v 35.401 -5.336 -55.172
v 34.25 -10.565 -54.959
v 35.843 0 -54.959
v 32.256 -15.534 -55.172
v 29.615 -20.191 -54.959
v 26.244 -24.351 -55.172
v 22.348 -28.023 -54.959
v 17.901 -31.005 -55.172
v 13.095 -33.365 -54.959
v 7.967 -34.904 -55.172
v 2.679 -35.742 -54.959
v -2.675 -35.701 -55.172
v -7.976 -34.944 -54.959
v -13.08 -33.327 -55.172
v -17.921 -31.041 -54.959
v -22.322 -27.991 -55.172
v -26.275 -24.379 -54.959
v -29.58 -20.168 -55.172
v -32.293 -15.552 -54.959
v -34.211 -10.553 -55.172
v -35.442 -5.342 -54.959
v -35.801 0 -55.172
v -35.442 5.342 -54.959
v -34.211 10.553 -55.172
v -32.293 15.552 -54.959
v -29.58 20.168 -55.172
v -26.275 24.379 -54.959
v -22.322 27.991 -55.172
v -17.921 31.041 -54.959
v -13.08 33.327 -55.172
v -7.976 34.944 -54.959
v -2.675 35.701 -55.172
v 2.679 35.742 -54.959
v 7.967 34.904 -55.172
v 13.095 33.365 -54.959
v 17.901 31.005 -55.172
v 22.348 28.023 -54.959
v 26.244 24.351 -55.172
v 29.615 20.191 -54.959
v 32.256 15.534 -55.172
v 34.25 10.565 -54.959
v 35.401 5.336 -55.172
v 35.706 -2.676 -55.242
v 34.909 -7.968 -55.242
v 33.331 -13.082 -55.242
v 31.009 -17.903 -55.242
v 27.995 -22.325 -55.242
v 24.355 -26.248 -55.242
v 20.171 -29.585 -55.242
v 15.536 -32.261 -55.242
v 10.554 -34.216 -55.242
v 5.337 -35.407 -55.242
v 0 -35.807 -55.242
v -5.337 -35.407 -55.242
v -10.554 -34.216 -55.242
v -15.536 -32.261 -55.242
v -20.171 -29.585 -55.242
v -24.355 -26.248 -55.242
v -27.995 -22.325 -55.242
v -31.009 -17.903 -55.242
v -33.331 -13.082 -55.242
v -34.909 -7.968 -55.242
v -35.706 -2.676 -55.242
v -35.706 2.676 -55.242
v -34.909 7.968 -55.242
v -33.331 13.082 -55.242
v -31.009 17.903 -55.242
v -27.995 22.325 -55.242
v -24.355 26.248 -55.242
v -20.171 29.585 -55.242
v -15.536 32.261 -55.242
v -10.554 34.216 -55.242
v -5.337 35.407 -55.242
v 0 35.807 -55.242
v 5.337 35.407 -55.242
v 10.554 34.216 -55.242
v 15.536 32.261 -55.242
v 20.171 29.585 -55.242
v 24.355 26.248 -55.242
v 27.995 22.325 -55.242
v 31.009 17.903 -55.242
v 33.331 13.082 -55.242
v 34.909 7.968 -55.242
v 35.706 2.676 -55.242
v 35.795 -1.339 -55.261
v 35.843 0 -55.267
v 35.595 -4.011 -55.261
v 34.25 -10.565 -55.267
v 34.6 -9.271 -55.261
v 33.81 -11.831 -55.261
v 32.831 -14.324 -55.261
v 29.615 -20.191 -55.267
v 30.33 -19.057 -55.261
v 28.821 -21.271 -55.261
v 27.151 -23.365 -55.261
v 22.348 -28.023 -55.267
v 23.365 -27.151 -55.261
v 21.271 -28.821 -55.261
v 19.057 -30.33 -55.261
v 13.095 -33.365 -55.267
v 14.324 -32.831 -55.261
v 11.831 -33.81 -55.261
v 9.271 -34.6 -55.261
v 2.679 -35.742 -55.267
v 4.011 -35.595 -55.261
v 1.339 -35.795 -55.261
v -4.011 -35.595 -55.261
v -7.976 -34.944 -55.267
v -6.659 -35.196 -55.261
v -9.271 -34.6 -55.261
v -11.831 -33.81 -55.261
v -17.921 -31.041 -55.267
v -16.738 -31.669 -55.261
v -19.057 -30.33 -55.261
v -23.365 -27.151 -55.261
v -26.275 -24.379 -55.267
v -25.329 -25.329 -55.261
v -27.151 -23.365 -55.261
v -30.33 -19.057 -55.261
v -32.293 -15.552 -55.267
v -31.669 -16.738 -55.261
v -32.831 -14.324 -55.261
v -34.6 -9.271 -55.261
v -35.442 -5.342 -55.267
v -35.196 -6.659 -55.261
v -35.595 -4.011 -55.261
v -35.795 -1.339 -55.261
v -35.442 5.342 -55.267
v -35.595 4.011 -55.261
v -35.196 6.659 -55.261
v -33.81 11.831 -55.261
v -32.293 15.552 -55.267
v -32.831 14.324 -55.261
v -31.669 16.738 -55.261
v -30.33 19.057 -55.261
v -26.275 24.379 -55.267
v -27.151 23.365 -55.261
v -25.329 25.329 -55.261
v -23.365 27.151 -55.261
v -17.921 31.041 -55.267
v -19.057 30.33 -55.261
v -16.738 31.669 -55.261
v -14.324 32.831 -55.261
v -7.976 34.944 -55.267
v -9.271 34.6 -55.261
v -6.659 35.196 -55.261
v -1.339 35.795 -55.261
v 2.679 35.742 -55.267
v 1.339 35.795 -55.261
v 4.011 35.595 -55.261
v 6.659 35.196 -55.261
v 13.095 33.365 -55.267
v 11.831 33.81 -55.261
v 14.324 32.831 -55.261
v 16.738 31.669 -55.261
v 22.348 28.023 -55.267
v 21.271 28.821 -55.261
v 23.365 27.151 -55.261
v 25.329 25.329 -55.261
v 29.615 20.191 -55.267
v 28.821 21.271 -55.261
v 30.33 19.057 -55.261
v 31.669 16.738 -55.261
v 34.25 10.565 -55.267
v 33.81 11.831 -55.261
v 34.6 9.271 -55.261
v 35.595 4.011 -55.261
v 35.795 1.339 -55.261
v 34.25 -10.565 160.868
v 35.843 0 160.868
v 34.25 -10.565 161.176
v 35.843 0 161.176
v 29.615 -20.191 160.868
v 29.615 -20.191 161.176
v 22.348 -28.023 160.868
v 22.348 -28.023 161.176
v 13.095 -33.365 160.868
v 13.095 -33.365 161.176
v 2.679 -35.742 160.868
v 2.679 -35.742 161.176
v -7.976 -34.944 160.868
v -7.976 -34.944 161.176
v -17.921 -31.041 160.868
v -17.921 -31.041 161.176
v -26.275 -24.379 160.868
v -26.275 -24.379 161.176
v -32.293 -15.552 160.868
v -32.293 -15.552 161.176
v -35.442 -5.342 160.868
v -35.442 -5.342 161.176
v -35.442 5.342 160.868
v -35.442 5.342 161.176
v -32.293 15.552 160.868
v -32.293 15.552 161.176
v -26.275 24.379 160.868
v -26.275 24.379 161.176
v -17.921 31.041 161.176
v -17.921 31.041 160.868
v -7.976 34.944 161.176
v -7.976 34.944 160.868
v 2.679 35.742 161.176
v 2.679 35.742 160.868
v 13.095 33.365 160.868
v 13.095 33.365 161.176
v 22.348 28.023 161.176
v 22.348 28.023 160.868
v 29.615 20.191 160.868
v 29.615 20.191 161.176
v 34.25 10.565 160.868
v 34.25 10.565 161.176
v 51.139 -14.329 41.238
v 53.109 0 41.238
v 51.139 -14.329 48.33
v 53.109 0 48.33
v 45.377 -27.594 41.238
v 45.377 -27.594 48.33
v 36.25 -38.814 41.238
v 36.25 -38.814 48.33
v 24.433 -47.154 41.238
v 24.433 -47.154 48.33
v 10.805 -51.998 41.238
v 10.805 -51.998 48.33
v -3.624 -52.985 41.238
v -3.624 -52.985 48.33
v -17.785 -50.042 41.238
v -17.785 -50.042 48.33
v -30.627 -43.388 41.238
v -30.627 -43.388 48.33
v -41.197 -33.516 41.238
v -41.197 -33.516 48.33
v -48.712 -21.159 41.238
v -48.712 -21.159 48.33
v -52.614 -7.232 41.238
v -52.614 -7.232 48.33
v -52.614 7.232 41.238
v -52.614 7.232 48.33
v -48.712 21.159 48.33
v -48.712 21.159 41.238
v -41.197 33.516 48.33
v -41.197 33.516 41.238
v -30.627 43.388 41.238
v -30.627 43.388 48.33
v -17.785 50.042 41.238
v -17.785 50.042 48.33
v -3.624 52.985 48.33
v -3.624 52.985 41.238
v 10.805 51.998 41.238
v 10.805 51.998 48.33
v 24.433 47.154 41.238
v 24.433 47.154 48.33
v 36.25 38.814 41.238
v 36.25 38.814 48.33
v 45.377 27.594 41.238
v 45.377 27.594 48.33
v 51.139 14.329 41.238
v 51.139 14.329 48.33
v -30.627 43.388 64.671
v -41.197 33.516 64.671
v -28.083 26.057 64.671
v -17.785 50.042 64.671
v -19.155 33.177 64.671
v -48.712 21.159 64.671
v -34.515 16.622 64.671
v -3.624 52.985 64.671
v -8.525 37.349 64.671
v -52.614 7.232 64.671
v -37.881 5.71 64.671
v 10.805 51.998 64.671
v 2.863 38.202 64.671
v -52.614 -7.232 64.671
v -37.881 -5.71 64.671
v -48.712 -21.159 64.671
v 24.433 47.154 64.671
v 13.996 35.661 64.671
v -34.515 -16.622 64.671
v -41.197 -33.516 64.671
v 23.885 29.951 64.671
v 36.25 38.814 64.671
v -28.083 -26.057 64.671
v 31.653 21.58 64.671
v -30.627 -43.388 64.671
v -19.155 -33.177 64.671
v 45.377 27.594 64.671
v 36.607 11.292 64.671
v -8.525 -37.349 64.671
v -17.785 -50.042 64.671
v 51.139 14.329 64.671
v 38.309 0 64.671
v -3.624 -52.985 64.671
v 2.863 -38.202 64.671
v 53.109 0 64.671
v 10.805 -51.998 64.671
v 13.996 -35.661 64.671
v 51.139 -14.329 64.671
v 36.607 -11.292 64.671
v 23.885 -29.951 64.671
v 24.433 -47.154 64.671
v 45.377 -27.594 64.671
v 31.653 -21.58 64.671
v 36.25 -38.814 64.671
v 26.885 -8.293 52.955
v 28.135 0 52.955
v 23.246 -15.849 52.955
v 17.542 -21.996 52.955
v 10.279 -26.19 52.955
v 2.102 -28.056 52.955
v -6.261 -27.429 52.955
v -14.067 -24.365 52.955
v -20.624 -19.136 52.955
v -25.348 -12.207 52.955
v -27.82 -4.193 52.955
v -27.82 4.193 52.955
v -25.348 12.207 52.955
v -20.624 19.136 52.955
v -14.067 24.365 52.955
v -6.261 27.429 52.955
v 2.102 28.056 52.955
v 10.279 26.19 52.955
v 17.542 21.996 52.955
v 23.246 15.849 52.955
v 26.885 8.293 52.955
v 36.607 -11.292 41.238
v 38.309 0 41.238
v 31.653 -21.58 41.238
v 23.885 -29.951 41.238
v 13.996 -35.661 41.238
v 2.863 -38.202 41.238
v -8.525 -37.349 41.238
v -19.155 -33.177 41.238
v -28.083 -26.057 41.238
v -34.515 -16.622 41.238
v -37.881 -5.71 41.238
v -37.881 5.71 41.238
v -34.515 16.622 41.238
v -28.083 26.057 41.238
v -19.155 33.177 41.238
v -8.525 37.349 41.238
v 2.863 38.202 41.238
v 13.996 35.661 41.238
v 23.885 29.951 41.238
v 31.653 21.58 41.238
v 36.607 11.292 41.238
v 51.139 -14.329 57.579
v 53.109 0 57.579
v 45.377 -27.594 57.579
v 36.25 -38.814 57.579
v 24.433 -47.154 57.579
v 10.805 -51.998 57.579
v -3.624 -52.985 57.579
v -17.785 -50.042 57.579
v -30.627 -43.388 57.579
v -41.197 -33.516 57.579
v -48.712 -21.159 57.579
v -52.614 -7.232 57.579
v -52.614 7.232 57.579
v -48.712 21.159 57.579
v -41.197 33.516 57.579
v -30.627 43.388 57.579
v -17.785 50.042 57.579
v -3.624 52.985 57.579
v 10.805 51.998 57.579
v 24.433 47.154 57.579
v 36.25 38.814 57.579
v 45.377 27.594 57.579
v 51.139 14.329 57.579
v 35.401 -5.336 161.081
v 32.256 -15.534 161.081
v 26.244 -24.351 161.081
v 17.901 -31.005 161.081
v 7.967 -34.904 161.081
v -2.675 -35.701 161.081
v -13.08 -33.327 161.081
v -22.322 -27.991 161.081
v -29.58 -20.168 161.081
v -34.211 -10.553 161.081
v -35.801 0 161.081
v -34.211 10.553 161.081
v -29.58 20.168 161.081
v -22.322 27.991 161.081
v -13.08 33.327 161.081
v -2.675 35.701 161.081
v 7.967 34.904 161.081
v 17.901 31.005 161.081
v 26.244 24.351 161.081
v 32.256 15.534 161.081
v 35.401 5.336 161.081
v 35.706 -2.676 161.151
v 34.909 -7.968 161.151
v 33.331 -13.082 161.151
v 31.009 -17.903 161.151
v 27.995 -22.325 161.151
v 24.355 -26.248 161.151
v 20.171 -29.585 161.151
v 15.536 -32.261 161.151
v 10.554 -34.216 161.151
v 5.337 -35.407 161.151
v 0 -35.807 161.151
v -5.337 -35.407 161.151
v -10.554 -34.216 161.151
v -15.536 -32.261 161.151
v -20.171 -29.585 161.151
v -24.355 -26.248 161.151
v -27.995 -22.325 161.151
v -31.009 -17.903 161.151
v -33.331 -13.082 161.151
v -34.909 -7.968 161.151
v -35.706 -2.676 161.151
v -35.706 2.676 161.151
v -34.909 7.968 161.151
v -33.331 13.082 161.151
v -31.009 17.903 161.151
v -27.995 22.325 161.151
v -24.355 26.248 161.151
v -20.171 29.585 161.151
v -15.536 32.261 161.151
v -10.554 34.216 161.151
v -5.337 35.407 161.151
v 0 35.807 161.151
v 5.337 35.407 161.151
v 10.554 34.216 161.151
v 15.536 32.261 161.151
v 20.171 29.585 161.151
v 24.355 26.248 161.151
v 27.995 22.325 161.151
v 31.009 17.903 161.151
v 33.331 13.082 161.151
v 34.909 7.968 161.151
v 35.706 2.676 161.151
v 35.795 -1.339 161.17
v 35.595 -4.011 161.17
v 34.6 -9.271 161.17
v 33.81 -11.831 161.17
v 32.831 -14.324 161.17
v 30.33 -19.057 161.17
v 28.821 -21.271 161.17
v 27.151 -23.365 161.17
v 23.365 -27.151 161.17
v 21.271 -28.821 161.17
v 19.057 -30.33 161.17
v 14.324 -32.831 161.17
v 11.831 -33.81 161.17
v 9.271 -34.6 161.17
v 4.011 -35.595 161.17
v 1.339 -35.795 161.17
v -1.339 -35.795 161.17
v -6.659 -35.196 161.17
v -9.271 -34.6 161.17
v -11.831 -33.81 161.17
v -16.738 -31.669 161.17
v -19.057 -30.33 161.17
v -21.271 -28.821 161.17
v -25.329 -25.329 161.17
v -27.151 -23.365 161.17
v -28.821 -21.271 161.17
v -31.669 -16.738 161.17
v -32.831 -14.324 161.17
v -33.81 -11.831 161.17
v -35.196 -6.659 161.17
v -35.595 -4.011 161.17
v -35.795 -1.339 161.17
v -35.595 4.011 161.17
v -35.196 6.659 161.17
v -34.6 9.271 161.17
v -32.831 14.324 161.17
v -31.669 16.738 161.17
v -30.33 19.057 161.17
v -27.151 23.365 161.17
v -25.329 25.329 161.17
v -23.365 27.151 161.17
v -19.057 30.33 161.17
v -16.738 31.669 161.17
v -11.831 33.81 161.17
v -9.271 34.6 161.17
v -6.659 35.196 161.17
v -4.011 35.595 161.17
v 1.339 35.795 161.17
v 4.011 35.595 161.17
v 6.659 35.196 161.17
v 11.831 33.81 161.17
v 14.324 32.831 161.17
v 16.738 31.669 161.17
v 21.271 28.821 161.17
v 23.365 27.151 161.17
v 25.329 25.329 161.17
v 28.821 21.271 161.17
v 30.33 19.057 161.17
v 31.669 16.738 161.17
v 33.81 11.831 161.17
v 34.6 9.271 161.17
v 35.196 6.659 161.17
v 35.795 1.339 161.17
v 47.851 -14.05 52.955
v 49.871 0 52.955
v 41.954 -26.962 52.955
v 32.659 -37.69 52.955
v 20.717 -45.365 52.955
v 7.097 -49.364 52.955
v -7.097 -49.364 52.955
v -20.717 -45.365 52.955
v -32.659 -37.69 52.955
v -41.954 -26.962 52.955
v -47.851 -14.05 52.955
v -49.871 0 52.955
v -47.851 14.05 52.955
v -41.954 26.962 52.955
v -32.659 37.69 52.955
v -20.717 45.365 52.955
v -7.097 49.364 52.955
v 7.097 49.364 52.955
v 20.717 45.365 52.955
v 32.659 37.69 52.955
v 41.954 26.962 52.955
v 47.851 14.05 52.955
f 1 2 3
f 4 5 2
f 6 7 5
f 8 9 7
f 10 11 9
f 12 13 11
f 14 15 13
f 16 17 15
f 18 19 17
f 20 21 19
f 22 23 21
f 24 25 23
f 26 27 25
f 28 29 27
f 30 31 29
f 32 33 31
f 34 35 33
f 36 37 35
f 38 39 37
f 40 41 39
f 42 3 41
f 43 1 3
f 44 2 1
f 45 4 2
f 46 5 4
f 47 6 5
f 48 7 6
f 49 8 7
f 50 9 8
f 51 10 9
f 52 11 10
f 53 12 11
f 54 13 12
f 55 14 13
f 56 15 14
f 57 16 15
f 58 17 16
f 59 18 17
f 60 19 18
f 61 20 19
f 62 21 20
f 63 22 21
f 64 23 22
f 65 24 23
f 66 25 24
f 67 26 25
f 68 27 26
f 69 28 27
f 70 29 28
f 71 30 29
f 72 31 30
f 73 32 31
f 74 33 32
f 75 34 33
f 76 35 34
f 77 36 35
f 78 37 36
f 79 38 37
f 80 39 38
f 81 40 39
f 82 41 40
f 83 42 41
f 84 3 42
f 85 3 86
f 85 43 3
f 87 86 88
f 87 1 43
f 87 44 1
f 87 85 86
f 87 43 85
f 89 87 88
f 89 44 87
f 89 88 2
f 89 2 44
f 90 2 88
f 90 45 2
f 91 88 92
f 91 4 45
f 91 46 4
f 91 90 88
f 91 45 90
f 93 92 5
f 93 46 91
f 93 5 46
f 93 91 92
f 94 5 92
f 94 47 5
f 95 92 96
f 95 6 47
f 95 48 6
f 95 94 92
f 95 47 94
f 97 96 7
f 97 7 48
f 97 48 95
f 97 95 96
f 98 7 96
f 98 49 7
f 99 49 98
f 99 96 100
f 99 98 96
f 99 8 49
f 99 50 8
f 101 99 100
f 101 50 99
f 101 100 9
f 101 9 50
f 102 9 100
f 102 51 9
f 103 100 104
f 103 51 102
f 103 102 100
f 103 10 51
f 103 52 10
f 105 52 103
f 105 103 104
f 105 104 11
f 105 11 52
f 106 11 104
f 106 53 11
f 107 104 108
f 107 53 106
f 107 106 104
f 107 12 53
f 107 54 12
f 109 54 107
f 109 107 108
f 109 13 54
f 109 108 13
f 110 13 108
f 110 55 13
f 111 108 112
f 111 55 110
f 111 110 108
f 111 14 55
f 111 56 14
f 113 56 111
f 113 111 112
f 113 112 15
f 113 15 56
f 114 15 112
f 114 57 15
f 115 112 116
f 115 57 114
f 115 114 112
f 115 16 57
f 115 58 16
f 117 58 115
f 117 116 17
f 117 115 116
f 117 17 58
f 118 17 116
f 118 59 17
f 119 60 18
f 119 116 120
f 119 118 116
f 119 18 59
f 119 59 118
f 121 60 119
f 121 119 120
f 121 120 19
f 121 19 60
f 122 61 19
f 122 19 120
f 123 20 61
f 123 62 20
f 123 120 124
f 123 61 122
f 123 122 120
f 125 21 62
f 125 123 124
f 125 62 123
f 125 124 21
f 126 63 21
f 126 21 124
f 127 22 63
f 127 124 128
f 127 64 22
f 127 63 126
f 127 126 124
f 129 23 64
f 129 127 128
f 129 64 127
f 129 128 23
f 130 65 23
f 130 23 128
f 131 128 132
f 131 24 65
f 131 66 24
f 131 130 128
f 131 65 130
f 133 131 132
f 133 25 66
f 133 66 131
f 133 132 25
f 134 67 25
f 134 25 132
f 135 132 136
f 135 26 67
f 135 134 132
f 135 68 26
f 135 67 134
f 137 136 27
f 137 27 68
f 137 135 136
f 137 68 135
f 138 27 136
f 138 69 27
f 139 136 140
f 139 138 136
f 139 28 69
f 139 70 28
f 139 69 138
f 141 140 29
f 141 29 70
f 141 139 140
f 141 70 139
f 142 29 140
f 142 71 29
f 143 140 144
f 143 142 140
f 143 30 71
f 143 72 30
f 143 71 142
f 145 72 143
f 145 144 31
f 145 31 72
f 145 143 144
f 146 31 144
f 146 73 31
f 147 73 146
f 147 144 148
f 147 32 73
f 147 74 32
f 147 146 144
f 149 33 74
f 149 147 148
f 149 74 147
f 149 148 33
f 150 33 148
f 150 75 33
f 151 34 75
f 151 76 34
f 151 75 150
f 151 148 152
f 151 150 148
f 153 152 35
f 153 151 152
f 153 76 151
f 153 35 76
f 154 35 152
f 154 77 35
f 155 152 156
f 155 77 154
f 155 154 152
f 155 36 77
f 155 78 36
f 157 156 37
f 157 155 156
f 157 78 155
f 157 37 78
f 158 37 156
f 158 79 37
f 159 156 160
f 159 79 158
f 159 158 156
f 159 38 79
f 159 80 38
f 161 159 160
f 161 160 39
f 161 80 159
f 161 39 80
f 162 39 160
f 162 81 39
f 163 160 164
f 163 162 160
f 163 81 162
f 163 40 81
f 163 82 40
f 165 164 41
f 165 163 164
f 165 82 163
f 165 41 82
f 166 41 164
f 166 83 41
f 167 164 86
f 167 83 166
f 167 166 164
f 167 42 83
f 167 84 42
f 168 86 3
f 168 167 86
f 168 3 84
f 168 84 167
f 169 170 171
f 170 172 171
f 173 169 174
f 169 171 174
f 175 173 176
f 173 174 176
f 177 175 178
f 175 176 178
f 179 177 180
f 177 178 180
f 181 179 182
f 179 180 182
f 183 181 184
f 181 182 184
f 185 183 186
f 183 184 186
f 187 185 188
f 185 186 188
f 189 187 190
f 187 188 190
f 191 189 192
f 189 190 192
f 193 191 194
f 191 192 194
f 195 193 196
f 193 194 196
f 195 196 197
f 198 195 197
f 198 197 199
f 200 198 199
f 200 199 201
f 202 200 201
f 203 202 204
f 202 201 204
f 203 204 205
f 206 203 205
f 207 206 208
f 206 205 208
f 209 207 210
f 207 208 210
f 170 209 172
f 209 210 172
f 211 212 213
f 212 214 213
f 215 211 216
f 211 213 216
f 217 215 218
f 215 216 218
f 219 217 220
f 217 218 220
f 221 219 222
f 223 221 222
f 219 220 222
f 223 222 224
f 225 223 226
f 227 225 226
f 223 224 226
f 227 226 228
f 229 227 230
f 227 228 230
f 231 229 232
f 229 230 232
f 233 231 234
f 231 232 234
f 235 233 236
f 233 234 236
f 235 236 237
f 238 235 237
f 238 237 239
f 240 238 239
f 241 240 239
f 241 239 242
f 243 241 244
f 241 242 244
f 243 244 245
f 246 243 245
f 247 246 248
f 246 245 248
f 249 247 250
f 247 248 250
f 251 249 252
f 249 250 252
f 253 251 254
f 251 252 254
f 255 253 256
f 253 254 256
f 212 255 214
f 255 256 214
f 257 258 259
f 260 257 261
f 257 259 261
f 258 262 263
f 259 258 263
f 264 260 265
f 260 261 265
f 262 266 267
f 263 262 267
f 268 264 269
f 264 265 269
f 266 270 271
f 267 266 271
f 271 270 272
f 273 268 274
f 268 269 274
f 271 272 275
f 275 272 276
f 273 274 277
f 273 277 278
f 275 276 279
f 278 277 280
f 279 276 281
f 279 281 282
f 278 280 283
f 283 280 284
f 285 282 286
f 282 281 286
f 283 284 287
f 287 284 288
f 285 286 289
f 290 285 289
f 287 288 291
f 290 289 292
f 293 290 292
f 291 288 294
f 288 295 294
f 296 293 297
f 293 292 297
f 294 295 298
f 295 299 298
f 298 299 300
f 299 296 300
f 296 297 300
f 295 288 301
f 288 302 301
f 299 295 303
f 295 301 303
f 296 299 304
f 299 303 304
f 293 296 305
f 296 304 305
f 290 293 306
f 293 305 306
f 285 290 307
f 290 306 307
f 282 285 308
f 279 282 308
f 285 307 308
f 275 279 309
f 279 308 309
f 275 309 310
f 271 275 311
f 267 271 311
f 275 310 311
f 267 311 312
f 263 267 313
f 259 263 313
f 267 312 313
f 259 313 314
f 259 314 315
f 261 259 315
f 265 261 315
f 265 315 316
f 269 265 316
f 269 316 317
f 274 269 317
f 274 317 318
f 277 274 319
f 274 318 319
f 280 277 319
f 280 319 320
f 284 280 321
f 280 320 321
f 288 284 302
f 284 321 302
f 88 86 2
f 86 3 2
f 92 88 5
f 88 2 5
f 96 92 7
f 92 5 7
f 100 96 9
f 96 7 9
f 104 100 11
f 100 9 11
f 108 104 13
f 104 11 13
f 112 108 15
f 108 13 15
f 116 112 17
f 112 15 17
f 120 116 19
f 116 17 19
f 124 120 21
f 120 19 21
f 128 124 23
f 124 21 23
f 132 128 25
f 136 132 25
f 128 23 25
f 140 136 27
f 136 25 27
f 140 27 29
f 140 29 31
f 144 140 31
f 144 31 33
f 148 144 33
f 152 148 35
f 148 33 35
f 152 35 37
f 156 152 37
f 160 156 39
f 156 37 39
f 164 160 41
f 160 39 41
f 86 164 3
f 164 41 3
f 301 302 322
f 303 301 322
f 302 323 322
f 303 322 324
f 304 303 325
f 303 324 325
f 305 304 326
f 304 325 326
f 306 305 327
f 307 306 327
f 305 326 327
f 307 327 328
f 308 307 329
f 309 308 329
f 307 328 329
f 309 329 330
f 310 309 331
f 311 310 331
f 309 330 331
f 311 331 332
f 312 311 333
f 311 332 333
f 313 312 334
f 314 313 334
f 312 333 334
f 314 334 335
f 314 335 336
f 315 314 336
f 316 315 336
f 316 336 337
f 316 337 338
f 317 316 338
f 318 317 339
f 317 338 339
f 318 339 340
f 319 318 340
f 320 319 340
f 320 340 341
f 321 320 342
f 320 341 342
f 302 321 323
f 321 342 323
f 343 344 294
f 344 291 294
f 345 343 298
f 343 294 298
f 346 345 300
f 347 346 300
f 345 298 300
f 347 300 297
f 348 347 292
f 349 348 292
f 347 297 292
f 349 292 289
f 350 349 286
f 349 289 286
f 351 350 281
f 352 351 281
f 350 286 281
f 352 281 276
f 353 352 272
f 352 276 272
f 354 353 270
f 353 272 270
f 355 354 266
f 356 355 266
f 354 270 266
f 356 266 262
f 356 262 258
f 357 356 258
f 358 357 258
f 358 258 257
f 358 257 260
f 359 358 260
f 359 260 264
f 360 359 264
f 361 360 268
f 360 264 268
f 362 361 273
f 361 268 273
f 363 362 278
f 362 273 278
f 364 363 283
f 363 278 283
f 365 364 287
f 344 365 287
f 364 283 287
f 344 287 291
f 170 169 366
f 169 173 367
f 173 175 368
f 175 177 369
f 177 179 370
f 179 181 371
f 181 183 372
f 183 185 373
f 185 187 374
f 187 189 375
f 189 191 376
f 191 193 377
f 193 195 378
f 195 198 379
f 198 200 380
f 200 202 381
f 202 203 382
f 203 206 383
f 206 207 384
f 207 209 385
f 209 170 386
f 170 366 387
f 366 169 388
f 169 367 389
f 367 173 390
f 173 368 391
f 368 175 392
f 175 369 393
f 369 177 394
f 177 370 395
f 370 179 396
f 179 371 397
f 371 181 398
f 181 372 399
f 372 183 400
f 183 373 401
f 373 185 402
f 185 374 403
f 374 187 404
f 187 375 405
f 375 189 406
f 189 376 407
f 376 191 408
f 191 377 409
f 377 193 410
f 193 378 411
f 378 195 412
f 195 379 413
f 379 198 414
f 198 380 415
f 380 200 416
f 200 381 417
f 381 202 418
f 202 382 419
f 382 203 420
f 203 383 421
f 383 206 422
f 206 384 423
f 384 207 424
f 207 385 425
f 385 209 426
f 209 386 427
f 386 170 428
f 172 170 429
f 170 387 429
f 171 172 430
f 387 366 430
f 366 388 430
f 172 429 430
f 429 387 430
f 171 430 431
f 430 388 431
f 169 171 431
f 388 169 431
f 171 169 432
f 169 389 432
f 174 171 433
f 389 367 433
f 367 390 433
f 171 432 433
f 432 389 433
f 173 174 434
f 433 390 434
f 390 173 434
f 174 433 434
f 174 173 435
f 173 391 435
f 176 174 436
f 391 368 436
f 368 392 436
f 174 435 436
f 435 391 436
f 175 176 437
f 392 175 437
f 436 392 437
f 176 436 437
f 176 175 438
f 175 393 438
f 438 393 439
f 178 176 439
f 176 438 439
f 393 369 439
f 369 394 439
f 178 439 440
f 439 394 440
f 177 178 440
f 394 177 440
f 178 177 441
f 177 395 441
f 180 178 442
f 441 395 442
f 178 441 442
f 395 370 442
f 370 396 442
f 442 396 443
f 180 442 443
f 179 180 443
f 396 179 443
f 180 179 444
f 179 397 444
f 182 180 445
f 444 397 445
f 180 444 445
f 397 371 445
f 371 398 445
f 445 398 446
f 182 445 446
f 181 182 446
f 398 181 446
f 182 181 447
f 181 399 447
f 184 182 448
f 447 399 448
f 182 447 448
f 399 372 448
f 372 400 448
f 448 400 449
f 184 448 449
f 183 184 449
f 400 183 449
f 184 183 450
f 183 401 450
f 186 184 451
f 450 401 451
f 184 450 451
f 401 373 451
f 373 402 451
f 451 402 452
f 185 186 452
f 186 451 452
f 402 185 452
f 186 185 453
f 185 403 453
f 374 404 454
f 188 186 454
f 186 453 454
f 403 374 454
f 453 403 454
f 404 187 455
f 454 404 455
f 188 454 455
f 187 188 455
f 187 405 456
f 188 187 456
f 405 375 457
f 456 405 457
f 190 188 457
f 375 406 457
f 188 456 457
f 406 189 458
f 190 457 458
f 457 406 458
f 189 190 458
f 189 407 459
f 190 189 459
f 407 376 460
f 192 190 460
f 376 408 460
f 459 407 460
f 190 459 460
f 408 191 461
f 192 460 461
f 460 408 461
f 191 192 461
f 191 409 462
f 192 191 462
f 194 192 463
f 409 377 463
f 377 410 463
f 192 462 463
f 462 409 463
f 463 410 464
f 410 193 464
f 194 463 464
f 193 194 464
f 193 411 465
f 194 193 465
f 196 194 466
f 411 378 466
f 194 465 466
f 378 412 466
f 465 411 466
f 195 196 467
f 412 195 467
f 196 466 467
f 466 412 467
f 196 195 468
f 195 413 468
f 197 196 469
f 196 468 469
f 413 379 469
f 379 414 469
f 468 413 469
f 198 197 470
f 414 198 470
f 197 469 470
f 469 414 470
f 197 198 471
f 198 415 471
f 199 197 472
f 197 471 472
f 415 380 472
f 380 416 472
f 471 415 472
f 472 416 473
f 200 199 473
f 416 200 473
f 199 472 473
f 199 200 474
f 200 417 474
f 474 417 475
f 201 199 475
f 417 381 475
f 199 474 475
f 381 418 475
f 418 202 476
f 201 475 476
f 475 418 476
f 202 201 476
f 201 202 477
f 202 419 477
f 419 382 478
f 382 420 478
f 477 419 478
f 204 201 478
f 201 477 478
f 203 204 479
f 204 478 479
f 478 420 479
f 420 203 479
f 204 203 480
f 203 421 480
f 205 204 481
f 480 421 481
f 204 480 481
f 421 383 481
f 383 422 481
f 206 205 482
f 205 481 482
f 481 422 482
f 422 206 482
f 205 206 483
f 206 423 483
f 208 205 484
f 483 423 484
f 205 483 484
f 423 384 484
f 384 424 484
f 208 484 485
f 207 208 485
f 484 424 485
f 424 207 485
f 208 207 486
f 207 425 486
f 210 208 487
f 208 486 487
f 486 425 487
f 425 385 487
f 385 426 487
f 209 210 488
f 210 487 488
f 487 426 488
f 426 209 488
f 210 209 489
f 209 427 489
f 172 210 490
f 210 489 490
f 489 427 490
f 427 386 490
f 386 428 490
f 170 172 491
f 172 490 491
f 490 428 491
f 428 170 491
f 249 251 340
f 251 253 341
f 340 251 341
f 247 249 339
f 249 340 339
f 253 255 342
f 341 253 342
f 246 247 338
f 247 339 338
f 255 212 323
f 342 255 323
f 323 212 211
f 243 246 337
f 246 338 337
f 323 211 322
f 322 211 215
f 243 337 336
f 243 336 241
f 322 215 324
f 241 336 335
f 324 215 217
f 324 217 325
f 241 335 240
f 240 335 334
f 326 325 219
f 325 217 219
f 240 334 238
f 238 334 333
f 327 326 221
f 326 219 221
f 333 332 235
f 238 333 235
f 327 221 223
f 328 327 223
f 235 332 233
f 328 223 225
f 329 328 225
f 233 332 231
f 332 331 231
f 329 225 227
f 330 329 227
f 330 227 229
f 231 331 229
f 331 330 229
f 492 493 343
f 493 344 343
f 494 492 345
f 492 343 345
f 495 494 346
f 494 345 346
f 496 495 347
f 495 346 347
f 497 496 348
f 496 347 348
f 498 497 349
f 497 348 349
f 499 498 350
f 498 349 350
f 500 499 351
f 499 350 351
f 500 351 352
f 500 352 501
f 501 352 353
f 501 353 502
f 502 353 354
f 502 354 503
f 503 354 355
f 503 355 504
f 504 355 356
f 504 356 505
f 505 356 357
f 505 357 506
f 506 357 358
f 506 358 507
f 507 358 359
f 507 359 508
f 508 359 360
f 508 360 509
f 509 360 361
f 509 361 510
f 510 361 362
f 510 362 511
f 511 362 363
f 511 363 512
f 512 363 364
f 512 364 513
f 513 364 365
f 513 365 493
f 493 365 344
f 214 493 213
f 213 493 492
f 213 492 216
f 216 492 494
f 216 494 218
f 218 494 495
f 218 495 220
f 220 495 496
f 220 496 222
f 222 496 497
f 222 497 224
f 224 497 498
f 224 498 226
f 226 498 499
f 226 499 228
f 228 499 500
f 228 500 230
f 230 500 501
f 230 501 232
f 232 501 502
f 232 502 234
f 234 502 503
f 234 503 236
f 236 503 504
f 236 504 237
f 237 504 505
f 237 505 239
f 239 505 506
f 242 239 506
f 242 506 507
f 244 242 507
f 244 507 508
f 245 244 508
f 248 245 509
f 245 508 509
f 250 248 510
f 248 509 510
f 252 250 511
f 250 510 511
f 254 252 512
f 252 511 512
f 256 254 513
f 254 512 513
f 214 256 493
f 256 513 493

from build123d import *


with BuildPart() as f1:
    # F0 (on Front) → F1 (revolve)
    with BuildSketch(Plane.XZ):
        with BuildLine():
            Line((35.8426310212, 160.8678996653), (35.8426310212, 161.1762195916))
            add(Edge.make_bspline(
                [(35.8426310212, 161.1762195916), (35.7692510566, 161.1782799319), (35.8059410389, 161.0230897986), (35.8426310212, 160.8678996653)],
                knots=[0.9757932931, 0.9757932931, 0.9757932931, 0.9757932931, 1, 1, 1, 1], degree=3))
        make_face()
    revolve(axis=Axis((0, 0, -4.085291177), (0, 0, -1)))


with BuildPart() as f1b:
    # F0 (on Front) → F1, piece 2 (revolve)
    with BuildSketch(Plane.XZ):
        with BuildLine():
            add(Edge.make_bspline(
                [(35.8426310212, -55.2670210635), (35.7692510566, -55.2690814038), (35.8059410389, -55.1138912704), (35.8426310212, -54.9587011372)],
                knots=[0.9757932931, 0.9757932931, 0.9757932931, 0.9757932931, 1, 1, 1, 1], degree=3))
            Line((35.8426310212, -55.2670210635), (35.8426310212, -54.9587011372))
        make_face()
    revolve(axis=Axis((0, 0, -4.085291177), (0, 0, -1)))


with BuildPart() as f1c:
    # F0 (on Front) → F1, piece 3 (revolve)
    with BuildSketch(Plane.XZ):
        Polygon((38.3092164993, 64.670898023), (28.1345378608, 52.9545992641), (38.3092164993, 41.2383005051), (41.6699527481, 41.2383005051), (49.8713611715, 52.9545992641), (41.6699527481, 64.670898023), align=None)
        Polygon((53.1087592335, 64.670898023), (41.6699527481, 64.670898023), (49.8713611715, 52.9545992641), (53.1087592335, 57.5794540374), align=None)
        Polygon((49.8713611715, 52.9545992641), (41.6699527481, 41.2383005051), (53.1087592335, 41.2383005051), (53.1087592335, 48.3297444908), align=None)
    revolve(axis=Axis((0, 0, -4.085291177), (0, 0, -1)))


solid = Compound([f1.part, f1b.part, f1c.part])
